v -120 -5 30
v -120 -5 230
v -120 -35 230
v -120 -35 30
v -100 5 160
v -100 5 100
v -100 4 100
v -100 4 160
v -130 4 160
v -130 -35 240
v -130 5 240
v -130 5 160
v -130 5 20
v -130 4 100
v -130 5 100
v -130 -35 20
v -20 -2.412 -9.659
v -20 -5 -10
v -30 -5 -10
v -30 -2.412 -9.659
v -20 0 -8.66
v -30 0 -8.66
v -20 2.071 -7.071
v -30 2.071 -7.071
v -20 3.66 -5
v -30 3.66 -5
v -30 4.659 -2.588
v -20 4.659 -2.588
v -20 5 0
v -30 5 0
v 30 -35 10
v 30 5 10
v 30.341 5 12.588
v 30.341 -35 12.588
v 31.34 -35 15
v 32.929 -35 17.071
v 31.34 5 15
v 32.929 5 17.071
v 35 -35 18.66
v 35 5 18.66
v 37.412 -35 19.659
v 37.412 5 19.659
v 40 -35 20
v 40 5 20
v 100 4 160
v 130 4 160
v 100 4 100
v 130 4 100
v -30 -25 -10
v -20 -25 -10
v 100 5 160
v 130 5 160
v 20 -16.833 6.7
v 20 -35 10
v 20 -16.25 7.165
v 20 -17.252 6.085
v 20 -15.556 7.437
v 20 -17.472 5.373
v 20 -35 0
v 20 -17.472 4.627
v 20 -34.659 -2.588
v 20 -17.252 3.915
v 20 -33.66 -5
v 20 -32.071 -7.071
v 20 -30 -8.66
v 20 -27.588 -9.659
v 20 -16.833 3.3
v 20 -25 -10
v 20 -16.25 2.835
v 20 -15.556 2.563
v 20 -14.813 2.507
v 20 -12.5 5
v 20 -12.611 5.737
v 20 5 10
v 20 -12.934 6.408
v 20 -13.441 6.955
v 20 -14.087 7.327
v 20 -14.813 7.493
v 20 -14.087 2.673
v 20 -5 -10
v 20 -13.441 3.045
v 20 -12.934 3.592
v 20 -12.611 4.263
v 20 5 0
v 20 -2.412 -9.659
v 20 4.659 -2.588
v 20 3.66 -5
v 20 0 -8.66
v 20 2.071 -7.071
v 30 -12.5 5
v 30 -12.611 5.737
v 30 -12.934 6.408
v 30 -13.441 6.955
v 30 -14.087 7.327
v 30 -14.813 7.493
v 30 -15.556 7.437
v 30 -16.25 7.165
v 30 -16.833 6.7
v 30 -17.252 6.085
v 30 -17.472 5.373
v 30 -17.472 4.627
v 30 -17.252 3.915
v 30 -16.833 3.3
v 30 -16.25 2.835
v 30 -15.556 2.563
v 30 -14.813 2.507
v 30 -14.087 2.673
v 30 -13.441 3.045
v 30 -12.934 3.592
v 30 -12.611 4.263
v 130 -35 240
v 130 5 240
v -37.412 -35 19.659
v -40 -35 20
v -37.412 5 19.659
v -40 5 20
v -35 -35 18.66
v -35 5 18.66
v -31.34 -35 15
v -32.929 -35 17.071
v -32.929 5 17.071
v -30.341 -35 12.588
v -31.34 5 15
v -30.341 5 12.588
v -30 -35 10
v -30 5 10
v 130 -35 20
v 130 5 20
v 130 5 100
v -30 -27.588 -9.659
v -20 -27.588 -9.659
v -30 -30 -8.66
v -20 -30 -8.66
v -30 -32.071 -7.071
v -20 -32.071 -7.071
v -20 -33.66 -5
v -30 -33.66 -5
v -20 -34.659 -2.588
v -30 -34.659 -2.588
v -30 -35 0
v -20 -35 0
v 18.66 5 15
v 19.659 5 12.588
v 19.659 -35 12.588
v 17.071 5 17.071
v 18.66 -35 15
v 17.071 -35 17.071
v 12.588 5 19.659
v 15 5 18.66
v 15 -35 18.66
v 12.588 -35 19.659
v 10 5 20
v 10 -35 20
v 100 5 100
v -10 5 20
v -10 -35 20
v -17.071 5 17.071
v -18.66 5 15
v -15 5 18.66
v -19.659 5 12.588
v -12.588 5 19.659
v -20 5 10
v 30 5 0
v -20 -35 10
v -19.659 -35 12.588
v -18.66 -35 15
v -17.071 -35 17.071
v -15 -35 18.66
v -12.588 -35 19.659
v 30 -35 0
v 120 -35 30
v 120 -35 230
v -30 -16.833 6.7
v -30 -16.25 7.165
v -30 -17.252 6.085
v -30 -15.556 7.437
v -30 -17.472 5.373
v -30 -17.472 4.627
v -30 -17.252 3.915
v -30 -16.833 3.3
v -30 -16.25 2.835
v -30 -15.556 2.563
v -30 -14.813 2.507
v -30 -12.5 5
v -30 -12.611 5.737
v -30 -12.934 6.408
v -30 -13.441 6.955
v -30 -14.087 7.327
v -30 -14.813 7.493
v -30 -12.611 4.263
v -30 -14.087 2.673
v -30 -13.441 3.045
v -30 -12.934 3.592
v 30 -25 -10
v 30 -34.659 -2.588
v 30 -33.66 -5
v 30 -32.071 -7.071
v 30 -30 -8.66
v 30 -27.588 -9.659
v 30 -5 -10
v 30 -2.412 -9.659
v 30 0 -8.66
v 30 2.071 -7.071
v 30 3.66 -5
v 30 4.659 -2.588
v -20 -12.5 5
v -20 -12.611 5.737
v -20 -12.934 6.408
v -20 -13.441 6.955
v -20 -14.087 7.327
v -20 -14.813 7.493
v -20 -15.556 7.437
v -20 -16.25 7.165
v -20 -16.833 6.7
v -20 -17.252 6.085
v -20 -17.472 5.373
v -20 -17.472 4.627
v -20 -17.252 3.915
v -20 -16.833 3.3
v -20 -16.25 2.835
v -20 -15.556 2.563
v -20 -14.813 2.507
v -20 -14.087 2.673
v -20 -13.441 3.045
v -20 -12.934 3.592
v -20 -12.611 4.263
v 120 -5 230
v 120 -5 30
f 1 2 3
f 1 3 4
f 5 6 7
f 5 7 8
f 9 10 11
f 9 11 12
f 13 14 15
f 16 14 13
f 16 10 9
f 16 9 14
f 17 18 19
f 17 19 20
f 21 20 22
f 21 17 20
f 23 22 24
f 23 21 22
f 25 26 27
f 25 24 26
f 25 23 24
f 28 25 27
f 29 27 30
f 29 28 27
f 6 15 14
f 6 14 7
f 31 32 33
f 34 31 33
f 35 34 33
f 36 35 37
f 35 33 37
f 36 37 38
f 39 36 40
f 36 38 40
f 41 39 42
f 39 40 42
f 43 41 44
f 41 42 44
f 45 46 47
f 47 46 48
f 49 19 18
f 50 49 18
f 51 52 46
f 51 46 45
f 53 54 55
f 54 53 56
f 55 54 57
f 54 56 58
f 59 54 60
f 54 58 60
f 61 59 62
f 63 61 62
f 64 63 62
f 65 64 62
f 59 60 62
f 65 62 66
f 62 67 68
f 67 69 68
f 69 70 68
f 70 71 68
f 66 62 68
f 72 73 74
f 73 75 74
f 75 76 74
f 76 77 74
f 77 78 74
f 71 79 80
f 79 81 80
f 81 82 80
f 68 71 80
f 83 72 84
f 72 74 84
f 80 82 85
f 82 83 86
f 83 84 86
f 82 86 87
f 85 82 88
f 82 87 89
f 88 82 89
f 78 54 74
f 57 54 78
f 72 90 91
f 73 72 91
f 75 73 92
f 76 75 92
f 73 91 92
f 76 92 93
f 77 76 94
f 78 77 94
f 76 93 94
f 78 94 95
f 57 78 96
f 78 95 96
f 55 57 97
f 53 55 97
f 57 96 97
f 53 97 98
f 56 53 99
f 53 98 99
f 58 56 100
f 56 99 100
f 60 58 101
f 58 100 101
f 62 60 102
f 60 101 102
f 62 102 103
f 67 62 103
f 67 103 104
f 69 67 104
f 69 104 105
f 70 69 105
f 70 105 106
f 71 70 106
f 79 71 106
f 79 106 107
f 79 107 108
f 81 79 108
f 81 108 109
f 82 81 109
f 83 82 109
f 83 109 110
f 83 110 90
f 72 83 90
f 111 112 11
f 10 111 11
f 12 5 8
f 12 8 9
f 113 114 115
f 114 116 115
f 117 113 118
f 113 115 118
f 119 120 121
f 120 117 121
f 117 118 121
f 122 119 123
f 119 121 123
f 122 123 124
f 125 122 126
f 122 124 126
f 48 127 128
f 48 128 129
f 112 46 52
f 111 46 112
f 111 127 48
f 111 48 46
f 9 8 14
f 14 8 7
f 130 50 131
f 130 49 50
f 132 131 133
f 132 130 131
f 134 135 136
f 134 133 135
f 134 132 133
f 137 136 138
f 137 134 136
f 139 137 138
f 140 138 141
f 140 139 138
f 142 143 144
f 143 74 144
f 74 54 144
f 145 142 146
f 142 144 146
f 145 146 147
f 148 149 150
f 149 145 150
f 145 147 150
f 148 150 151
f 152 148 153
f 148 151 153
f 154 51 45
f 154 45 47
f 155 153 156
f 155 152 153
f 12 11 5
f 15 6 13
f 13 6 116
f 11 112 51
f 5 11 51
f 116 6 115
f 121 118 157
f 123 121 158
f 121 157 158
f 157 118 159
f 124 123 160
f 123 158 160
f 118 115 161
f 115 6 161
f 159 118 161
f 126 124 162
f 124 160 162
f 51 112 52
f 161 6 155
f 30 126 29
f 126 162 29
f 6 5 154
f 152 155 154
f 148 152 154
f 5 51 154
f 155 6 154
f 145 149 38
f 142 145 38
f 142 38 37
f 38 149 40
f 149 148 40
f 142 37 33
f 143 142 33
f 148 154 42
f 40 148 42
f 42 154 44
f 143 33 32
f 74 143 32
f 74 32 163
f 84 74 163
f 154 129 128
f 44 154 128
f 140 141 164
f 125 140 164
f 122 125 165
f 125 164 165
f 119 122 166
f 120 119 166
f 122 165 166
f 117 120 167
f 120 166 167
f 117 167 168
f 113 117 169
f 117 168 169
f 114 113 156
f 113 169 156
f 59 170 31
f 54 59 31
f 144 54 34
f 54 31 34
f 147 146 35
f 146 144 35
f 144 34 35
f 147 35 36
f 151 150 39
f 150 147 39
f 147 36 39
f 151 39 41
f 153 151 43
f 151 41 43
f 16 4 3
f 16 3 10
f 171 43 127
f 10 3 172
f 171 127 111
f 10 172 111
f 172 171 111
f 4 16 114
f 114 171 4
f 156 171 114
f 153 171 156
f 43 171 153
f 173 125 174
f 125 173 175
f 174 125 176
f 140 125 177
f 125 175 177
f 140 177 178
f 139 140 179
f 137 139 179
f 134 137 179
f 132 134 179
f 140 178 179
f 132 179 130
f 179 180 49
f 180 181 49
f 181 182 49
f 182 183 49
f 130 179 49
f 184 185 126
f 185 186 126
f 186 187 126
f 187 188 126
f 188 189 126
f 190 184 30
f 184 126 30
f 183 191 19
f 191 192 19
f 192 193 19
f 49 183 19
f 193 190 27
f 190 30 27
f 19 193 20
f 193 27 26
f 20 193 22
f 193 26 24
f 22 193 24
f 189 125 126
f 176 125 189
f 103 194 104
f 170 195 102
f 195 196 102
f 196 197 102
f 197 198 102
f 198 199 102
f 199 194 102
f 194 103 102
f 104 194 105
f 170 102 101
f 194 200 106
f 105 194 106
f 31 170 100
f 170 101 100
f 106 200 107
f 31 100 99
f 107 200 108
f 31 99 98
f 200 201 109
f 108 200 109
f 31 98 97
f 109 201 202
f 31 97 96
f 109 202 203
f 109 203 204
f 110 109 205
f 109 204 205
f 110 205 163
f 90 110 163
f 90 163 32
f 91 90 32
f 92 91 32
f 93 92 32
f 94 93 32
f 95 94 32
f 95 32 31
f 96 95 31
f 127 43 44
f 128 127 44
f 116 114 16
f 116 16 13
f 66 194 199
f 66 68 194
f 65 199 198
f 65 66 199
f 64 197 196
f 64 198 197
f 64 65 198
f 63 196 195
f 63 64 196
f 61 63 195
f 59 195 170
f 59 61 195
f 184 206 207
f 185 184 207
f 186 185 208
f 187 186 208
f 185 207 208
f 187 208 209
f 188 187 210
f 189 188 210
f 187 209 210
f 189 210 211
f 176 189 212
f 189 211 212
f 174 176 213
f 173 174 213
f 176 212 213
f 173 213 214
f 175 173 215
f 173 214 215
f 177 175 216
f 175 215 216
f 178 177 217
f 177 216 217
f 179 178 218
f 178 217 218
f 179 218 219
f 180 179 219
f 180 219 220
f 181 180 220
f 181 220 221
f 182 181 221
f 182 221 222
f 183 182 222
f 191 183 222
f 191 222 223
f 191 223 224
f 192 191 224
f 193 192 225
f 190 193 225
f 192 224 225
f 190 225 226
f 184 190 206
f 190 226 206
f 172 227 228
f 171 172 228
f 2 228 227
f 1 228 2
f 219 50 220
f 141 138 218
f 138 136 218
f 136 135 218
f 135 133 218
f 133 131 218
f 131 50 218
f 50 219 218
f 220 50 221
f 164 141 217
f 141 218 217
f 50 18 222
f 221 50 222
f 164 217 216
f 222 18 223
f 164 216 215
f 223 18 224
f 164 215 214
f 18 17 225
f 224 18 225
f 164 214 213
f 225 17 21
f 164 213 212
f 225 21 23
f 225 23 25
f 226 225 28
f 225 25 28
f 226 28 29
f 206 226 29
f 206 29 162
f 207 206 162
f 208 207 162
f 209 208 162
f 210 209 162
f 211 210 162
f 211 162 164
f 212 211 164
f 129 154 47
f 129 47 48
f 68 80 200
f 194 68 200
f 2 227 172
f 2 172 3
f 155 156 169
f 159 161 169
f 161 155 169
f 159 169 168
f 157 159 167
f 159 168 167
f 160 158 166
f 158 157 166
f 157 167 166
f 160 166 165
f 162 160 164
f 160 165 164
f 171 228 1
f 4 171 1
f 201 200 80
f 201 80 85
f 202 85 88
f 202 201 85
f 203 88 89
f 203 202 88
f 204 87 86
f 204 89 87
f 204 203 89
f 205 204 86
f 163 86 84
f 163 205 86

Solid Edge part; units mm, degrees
sketch "Sketch1" plane through (0, 0, 0) normal (1, 0, 0) x (0, 1, 0)
  circle A0 centre (0, 0) radius 2.5
extrude "Protrusion1" add sketch "Sketch1" along normal mid plane 40
sketch "Sketch2" plane through (0, 0, 0) normal (0, -1, 0) x (1, 0, 0)
  line L0 (30, 0) -> (30, 20)
  line L1 (30, -10) -> (30, 0)
  line L2 (20, -10) -> (30, -10)
  line L3 (20, 20) -> (20, -10)
  line L4 (20, 20) -> (-20, 20)
  line L5 (-20, -10) -> (-20, 20)
  line L6 (-30, -10) -> (-20, -10)
  line L7 (-30, 0) -> (-30, -10)
  line L8 (-30, 20) -> (-30, 0)
  line L9 (-30, 30) -> (-30, 20)
  line L10 (30, 30) -> (-30, 30)
  line L11 (30, 20) -> (30, 30)
extrude "ExtrudedProtrusion_2" add sketch "Sketch2" along normal mid plane 10
sketch "Sketch3" plane through (0, -5, 10) normal (0, -1, 0) x (1, 0, 0)
  line L0 (-20, -20) -> (-20, -5)
  line L1 (-20, -5) -> (20, -5)
  line L2 (20, -5) -> (20, -20)
  line L3 (20, -20) -> (-20, -20)
extrude "ExtrudedCutout_1" cut sketch "Sketch3" against normal blind 16.4245
sketch "Sketch4" plane through (0, -5, 10) normal (0, -1, 0) x (1, 0, 0)
  line L0 (-30, -20) -> (-30, 20)
  line L1 (-30, 20) -> (30, 20)
  line L2 (30, 20) -> (30, -20)
  line L3 (30, -20) -> (20, -20)
  line L4 (20, -20) -> (20, 10)
  line L5 (20, 10) -> (-20, 10)
  line L6 (-20, 10) -> (-20, -20)
  line L7 (-20, -20) -> (-30, -20)
extrude "ExtrudedProtrusion_3" add sketch "Sketch4" along normal blind 30
sketch "Sketch5" plane through (30, -15, 10) normal (1, 0, 0) x (0, 1, 0)
  circle A0 centre (0, -5) radius 2.5
extrude "ExtrudedCutout_2" cut sketch "Sketch5" against normal blind 72.3648
fillet "Round_1" radius 10 4 edges at (-25, -35, -10) (25, -35, -10) (-25, 5, -10) (25, 5, -10)
sketch "Sketch6" plane through (0, -15, 30) normal (0, 0, 1) x (-1, 0, 0)
  line L0 (-30, -20) -> (-30, -10)
  line L1 (-30, -10) -> (30, -10)
  line L2 (30, -10) -> (30, -20)
  line L3 (30, -20) -> (-30, -20)
extrude "ExtrudedProtrusion_4" add sketch "Sketch6" along normal blind 210
sketch "Sketch7" plane through (0, -5, 135) normal (0, -1, 0) x (0, 0, 1)
  line L0 (105, -30) -> (95, -30)
  line L1 (95, -30) -> (95, 30)
  line L2 (95, 30) -> (105, 30)
  line L3 (105, 30) -> (105, -30)
extrude "Protrusion2" add sketch "Sketch7" along normal up to vertex (30 mm away)
sketch "Sketch8" plane through (30, -15, 115) normal (1, 0, 0) x (0, 0, 1)
  line L0 (-85, 20) -> (-95, 20)
  line L1 (-95, 20) -> (-95, -20)
  line L2 (-95, -20) -> (125, -20)
  line L3 (125, -20) -> (125, 20)
  line L4 (125, 20) -> (115, 20)
  line L5 (115, 20) -> (115, -10)
  line L6 (115, -10) -> (-85, -10)
  line L7 (-85, -10) -> (-85, 20)
extrude "ExtrudedProtrusion_6" add sketch "Sketch8" along normal blind 100
sketch "Sketch9" plane through (-30, -15, 115) normal (-1, 0, 0) x (0, 0, -1)
  line L0 (-125, 20) -> (-125, -20)
  line L1 (95, -20) -> (-125, -20)
  line L2 (95, 20) -> (95, -20)
  line L3 (85, 20) -> (95, 20)
  line L4 (85, -10) -> (85, 20)
  line L5 (-115, -10) -> (85, -10)
  line L6 (-115, 20) -> (-115, -10)
  line L7 (-125, 20) -> (-115, 20)
extrude "ExtrudedProtrusion_7" add sketch "Sketch9" along normal blind 100
sketch "Sketch10" plane through (0, -5, 130) normal (0, -1, 0) x (1, 0, 0)
  line L0 (-130, 100) -> (-120, 100)
  line L1 (-120, 100) -> (-120, -100)
  line L2 (-120, -100) -> (-130, -100)
  line L3 (-130, -100) -> (-130, 100)
  line L4 (130, 100) -> (120, 100)
  line L5 (120, 100) -> (120, -100)
  line L6 (120, -100) -> (130, -100)
  line L7 (130, -100) -> (130, 100)
extrude "ExtrudedProtrusion_8" add sketch "Sketch10" along normal blind 30
fillet "Round_2" radius 10 4 edges at (-30, -15, 20) (30, -15, 20) (-20, -15, 20) (20, -15, 20)
sketch "Sketch11" plane through (0, 5, 120) normal (0, 1, 0) x (0, 0, -1)
  line L0 (-40, 130) -> (-10, 130)
  line L1 (-10, 130) -> (20, 130)
  line L2 (20, 130) -> (20, 100)
  line L3 (20, 100) -> (-40, 100)
  line L4 (-40, 100) -> (-40, 130)
  line L5 (-40, -130) -> (-40, -100)
  line L6 (-40, -100) -> (20, -100)
  line L7 (20, -100) -> (20, -130)
  line L8 (20, -130) -> (-40, -130)
extrude "ExtrudedCutout_3" cut sketch "Sketch11" against normal blind 1
